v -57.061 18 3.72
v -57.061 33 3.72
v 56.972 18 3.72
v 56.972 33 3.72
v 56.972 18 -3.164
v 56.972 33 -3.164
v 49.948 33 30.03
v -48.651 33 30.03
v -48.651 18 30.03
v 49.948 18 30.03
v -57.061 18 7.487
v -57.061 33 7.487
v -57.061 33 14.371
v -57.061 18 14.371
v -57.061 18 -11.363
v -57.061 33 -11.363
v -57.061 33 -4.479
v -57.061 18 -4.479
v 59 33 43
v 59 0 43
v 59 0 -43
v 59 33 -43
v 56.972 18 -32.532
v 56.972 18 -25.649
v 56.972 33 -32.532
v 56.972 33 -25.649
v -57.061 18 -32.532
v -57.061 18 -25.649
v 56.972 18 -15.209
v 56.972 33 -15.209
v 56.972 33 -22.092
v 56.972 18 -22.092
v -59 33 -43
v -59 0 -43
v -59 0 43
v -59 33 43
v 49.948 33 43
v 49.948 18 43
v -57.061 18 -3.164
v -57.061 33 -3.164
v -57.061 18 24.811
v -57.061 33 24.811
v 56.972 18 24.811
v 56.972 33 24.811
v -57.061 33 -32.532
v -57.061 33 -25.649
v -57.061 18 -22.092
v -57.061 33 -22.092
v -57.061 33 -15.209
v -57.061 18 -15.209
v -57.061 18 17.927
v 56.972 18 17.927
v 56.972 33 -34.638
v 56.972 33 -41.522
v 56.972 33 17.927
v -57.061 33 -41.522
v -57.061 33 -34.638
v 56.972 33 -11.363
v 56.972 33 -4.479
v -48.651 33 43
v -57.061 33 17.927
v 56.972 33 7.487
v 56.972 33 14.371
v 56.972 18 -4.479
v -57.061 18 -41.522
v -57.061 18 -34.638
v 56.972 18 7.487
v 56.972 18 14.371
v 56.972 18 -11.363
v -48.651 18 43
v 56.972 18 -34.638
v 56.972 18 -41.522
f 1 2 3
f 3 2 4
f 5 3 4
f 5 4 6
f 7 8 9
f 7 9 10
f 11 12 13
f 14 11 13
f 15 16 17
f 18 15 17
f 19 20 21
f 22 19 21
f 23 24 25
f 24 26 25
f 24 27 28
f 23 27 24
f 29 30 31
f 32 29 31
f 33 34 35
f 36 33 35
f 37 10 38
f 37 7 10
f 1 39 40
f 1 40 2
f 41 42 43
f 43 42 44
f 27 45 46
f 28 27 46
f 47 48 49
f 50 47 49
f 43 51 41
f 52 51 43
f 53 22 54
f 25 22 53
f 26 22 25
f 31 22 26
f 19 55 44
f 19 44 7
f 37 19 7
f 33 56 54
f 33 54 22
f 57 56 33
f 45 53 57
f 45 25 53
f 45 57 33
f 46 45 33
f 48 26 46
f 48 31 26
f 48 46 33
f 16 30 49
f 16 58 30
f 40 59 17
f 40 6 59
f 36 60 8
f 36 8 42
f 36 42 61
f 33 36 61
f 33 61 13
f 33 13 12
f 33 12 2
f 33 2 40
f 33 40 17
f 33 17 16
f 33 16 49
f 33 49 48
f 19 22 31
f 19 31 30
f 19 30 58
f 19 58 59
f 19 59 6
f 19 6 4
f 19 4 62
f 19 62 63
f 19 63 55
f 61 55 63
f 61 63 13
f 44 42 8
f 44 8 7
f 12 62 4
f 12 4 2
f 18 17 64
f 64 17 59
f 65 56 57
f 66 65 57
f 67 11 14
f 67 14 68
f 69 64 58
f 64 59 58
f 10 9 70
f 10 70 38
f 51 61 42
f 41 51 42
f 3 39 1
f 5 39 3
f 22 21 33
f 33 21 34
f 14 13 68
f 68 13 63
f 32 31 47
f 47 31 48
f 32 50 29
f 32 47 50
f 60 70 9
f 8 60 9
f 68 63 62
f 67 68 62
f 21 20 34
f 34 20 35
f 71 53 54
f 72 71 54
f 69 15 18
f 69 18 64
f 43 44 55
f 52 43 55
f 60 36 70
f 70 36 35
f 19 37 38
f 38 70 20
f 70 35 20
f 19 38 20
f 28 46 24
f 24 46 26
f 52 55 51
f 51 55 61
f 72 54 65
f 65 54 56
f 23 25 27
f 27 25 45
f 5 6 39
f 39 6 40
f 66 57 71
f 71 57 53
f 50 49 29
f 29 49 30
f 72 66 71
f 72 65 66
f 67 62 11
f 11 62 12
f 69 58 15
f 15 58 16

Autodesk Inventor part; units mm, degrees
ref_plane "YZ Plane" through (0, 0, 0) normal (1, 0, 0) x (0, 1, 0)
ref_plane "XZ Plane" through (0, 0, 0) normal (0, 1, 0) x (-1, 0, 0)
ref_plane "XY Plane" through (0, 0, 0) normal (0, 0, 1) x (1, 0, 0)
sketch "Sketch1" plane through (0, 0, 0) normal (0, 1, 0) x (-1, 0, 0)
  line L0 (-59, -43) -> (59, -43)
  line L1 (59, -43) -> (59, 43)
  line L2 (59, 43) -> (-59, 43)
  line L3 (-59, 43) -> (-59, -43)
  line L4 (-59, -43) -> (59, 43) construction
  line L5 (59, -43) -> (-59, 43) construction
  line L6 (56.9723, 41.5222) -> (-57.0608, 41.5222)
  line L7 (-57.0608, 41.5222) -> (-57.0608, 34.6385)
  line L8 (-57.0608, 34.6385) -> (56.9723, 34.6385)
  line L9 (56.9723, 34.6385) -> (56.9723, 41.5222)
  line L10 (56.9723, 32.5324) -> (-57.0608, 32.5324)
  line L11 (-57.0608, 32.5324) -> (-57.0608, 25.6486)
  line L12 (-57.0608, 25.6486) -> (56.9723, 25.6486)
  line L13 (56.9723, 25.6486) -> (56.9723, 32.5324)
  line L14 (56.9723, 22.0925) -> (-57.0608, 22.0925)
  line L15 (-57.0608, 22.0925) -> (-57.0608, 15.2088)
  line L16 (-57.0608, 15.2088) -> (56.9723, 15.2088)
  line L17 (56.9723, 15.2088) -> (56.9723, 22.0925)
  line L18 (56.9723, 11.3627) -> (-57.0608, 11.3627)
  line L19 (-57.0608, 11.3627) -> (-57.0608, 4.479)
  line L20 (-57.0608, 4.479) -> (56.9723, 4.479)
  line L21 (56.9723, 4.479) -> (56.9723, 11.3627)
  line L22 (56.9723, 3.1636) -> (-57.0608, 3.1636)
  line L23 (-57.0608, 3.1636) -> (-57.0608, -3.7202)
  line L24 (-57.0608, -3.7202) -> (56.9723, -3.7202)
  line L25 (56.9723, -3.7202) -> (56.9723, 3.1636)
  line L26 (56.9723, -7.487) -> (-57.0608, -7.487)
  line L27 (-57.0608, -7.487) -> (-57.0608, -14.3707)
  line L28 (-57.0608, -14.3707) -> (56.9723, -14.3707)
  line L29 (56.9723, -14.3707) -> (56.9723, -7.487)
  line L30 (56.9723, -17.9268) -> (-57.0608, -17.9268)
  line L31 (-57.0608, -17.9268) -> (-57.0608, -24.8106)
  line L32 (-57.0608, -24.8106) -> (56.9723, -24.8106)
  line L33 (56.9723, -24.8106) -> (56.9723, -17.9268)
  line L34 (49.9475, -43) -> (-48.6509, -43)
  line L35 (-48.6509, -43) -> (-48.6509, -30.0305)
  line L36 (-48.6509, -30.0305) -> (49.9475, -30.0305)
  line L37 (49.9475, -30.0305) -> (49.9475, -43)
  point P0 (0, 0)
  dimension "d0" = 118
  dimension "d1" = 86
extrude "Extrusion1" add sketch "Sketch1" along normal blind 33 contours L3 L2 L1 L0 L37 L36 L35 | L35 L36 L37 L0 | L9 L8 L7 L6 | L13 L12 L11 L10 | L17 L16 L15 L14 | L21 L20 L19 L18 | L25 L24 L23 L22 | L29 L28 L27 L26 | L33 L32 L31 L30
sketch "Sketch2" plane through (0, 33, 0) normal (0, 1, 0) x (1, 0, 0)
  line L0 (-59, -43) -> (59, -43)
  line L1 (59, -43) -> (59, 43)
  line L2 (59, 43) -> (-59, 43)
  line L3 (-59, 43) -> (-59, -43)
  line L4 (-59, -43) -> (59, 43) construction
  line L5 (59, -43) -> (-59, 43) construction
  line L6 (56.9723, 41.5222) -> (-57.0608, 41.5222)
  line L7 (-57.0608, 41.5222) -> (-57.0608, 34.6385)
  line L8 (-57.0608, 34.6385) -> (56.9723, 34.6385)
  line L9 (56.9723, 34.6385) -> (56.9723, 41.5222)
  line L10 (56.9723, 25.6486) -> (56.9723, 32.5324)
  line L11 (-57.0608, 25.6486) -> (56.9723, 25.6486)
  line L12 (56.9723, 32.5324) -> (-57.0608, 32.5324)
  line L13 (-57.0608, 32.5324) -> (-57.0608, 25.6486)
  line L14 (56.9723, 15.2088) -> (56.9723, 22.0925)
  line L15 (-57.0608, 15.2088) -> (56.9723, 15.2088)
  line L16 (56.9723, 22.0925) -> (-57.0608, 22.0925)
  line L17 (-57.0608, 22.0925) -> (-57.0608, 15.2088)
  line L18 (56.9723, 4.479) -> (56.9723, 11.3627)
  line L19 (-57.0608, 4.479) -> (56.9723, 4.479)
  line L20 (56.9723, 11.3627) -> (-57.0608, 11.3627)
  line L21 (-57.0608, 11.3627) -> (-57.0608, 4.479)
  line L22 (56.9723, -3.7202) -> (56.9723, 3.1636)
  line L23 (-57.0608, -3.7202) -> (56.9723, -3.7202)
  line L24 (56.9723, 3.1636) -> (-57.0608, 3.1636)
  line L25 (-57.0608, 3.1636) -> (-57.0608, -3.7202)
  line L26 (56.9723, -14.3707) -> (56.9723, -7.487)
  line L27 (-57.0608, -14.3707) -> (56.9723, -14.3707)
  line L28 (56.9723, -7.487) -> (-57.0608, -7.487)
  line L29 (-57.0608, -7.487) -> (-57.0608, -14.3707)
  line L30 (56.9723, -24.8106) -> (56.9723, -17.9268)
  line L31 (-57.0608, -24.8106) -> (56.9723, -24.8106)
  line L32 (56.9723, -17.9268) -> (-57.0608, -17.9268)
  line L33 (-57.0608, -17.9268) -> (-57.0608, -24.8106)
  line L34 (49.9475, -43) -> (-48.6509, -43)
  line L35 (-48.6509, -43) -> (-48.6509, -30.0305)
  line L36 (-48.6509, -30.0305) -> (49.9475, -30.0305)
  line L37 (49.9475, -30.0305) -> (49.9475, -43)
  point P0 (0, 0)
  point P1 (0, 0)
  dimension "d4" = 118
  dimension "d5" = 86
extrude "Extrusion2" cut sketch "Sketch2" against normal blind 15 contours L35 L36 L37 L0 | L9 L8 L7 L6 | L11 L13 L12 L10 | L15 L17 L16 L14 | L19 L21 L20 L18 | L23 L25 L24 L22 | L27 L29 L28 L26 | L31 L33 L32 L30
properties part number "Motor_vez"
